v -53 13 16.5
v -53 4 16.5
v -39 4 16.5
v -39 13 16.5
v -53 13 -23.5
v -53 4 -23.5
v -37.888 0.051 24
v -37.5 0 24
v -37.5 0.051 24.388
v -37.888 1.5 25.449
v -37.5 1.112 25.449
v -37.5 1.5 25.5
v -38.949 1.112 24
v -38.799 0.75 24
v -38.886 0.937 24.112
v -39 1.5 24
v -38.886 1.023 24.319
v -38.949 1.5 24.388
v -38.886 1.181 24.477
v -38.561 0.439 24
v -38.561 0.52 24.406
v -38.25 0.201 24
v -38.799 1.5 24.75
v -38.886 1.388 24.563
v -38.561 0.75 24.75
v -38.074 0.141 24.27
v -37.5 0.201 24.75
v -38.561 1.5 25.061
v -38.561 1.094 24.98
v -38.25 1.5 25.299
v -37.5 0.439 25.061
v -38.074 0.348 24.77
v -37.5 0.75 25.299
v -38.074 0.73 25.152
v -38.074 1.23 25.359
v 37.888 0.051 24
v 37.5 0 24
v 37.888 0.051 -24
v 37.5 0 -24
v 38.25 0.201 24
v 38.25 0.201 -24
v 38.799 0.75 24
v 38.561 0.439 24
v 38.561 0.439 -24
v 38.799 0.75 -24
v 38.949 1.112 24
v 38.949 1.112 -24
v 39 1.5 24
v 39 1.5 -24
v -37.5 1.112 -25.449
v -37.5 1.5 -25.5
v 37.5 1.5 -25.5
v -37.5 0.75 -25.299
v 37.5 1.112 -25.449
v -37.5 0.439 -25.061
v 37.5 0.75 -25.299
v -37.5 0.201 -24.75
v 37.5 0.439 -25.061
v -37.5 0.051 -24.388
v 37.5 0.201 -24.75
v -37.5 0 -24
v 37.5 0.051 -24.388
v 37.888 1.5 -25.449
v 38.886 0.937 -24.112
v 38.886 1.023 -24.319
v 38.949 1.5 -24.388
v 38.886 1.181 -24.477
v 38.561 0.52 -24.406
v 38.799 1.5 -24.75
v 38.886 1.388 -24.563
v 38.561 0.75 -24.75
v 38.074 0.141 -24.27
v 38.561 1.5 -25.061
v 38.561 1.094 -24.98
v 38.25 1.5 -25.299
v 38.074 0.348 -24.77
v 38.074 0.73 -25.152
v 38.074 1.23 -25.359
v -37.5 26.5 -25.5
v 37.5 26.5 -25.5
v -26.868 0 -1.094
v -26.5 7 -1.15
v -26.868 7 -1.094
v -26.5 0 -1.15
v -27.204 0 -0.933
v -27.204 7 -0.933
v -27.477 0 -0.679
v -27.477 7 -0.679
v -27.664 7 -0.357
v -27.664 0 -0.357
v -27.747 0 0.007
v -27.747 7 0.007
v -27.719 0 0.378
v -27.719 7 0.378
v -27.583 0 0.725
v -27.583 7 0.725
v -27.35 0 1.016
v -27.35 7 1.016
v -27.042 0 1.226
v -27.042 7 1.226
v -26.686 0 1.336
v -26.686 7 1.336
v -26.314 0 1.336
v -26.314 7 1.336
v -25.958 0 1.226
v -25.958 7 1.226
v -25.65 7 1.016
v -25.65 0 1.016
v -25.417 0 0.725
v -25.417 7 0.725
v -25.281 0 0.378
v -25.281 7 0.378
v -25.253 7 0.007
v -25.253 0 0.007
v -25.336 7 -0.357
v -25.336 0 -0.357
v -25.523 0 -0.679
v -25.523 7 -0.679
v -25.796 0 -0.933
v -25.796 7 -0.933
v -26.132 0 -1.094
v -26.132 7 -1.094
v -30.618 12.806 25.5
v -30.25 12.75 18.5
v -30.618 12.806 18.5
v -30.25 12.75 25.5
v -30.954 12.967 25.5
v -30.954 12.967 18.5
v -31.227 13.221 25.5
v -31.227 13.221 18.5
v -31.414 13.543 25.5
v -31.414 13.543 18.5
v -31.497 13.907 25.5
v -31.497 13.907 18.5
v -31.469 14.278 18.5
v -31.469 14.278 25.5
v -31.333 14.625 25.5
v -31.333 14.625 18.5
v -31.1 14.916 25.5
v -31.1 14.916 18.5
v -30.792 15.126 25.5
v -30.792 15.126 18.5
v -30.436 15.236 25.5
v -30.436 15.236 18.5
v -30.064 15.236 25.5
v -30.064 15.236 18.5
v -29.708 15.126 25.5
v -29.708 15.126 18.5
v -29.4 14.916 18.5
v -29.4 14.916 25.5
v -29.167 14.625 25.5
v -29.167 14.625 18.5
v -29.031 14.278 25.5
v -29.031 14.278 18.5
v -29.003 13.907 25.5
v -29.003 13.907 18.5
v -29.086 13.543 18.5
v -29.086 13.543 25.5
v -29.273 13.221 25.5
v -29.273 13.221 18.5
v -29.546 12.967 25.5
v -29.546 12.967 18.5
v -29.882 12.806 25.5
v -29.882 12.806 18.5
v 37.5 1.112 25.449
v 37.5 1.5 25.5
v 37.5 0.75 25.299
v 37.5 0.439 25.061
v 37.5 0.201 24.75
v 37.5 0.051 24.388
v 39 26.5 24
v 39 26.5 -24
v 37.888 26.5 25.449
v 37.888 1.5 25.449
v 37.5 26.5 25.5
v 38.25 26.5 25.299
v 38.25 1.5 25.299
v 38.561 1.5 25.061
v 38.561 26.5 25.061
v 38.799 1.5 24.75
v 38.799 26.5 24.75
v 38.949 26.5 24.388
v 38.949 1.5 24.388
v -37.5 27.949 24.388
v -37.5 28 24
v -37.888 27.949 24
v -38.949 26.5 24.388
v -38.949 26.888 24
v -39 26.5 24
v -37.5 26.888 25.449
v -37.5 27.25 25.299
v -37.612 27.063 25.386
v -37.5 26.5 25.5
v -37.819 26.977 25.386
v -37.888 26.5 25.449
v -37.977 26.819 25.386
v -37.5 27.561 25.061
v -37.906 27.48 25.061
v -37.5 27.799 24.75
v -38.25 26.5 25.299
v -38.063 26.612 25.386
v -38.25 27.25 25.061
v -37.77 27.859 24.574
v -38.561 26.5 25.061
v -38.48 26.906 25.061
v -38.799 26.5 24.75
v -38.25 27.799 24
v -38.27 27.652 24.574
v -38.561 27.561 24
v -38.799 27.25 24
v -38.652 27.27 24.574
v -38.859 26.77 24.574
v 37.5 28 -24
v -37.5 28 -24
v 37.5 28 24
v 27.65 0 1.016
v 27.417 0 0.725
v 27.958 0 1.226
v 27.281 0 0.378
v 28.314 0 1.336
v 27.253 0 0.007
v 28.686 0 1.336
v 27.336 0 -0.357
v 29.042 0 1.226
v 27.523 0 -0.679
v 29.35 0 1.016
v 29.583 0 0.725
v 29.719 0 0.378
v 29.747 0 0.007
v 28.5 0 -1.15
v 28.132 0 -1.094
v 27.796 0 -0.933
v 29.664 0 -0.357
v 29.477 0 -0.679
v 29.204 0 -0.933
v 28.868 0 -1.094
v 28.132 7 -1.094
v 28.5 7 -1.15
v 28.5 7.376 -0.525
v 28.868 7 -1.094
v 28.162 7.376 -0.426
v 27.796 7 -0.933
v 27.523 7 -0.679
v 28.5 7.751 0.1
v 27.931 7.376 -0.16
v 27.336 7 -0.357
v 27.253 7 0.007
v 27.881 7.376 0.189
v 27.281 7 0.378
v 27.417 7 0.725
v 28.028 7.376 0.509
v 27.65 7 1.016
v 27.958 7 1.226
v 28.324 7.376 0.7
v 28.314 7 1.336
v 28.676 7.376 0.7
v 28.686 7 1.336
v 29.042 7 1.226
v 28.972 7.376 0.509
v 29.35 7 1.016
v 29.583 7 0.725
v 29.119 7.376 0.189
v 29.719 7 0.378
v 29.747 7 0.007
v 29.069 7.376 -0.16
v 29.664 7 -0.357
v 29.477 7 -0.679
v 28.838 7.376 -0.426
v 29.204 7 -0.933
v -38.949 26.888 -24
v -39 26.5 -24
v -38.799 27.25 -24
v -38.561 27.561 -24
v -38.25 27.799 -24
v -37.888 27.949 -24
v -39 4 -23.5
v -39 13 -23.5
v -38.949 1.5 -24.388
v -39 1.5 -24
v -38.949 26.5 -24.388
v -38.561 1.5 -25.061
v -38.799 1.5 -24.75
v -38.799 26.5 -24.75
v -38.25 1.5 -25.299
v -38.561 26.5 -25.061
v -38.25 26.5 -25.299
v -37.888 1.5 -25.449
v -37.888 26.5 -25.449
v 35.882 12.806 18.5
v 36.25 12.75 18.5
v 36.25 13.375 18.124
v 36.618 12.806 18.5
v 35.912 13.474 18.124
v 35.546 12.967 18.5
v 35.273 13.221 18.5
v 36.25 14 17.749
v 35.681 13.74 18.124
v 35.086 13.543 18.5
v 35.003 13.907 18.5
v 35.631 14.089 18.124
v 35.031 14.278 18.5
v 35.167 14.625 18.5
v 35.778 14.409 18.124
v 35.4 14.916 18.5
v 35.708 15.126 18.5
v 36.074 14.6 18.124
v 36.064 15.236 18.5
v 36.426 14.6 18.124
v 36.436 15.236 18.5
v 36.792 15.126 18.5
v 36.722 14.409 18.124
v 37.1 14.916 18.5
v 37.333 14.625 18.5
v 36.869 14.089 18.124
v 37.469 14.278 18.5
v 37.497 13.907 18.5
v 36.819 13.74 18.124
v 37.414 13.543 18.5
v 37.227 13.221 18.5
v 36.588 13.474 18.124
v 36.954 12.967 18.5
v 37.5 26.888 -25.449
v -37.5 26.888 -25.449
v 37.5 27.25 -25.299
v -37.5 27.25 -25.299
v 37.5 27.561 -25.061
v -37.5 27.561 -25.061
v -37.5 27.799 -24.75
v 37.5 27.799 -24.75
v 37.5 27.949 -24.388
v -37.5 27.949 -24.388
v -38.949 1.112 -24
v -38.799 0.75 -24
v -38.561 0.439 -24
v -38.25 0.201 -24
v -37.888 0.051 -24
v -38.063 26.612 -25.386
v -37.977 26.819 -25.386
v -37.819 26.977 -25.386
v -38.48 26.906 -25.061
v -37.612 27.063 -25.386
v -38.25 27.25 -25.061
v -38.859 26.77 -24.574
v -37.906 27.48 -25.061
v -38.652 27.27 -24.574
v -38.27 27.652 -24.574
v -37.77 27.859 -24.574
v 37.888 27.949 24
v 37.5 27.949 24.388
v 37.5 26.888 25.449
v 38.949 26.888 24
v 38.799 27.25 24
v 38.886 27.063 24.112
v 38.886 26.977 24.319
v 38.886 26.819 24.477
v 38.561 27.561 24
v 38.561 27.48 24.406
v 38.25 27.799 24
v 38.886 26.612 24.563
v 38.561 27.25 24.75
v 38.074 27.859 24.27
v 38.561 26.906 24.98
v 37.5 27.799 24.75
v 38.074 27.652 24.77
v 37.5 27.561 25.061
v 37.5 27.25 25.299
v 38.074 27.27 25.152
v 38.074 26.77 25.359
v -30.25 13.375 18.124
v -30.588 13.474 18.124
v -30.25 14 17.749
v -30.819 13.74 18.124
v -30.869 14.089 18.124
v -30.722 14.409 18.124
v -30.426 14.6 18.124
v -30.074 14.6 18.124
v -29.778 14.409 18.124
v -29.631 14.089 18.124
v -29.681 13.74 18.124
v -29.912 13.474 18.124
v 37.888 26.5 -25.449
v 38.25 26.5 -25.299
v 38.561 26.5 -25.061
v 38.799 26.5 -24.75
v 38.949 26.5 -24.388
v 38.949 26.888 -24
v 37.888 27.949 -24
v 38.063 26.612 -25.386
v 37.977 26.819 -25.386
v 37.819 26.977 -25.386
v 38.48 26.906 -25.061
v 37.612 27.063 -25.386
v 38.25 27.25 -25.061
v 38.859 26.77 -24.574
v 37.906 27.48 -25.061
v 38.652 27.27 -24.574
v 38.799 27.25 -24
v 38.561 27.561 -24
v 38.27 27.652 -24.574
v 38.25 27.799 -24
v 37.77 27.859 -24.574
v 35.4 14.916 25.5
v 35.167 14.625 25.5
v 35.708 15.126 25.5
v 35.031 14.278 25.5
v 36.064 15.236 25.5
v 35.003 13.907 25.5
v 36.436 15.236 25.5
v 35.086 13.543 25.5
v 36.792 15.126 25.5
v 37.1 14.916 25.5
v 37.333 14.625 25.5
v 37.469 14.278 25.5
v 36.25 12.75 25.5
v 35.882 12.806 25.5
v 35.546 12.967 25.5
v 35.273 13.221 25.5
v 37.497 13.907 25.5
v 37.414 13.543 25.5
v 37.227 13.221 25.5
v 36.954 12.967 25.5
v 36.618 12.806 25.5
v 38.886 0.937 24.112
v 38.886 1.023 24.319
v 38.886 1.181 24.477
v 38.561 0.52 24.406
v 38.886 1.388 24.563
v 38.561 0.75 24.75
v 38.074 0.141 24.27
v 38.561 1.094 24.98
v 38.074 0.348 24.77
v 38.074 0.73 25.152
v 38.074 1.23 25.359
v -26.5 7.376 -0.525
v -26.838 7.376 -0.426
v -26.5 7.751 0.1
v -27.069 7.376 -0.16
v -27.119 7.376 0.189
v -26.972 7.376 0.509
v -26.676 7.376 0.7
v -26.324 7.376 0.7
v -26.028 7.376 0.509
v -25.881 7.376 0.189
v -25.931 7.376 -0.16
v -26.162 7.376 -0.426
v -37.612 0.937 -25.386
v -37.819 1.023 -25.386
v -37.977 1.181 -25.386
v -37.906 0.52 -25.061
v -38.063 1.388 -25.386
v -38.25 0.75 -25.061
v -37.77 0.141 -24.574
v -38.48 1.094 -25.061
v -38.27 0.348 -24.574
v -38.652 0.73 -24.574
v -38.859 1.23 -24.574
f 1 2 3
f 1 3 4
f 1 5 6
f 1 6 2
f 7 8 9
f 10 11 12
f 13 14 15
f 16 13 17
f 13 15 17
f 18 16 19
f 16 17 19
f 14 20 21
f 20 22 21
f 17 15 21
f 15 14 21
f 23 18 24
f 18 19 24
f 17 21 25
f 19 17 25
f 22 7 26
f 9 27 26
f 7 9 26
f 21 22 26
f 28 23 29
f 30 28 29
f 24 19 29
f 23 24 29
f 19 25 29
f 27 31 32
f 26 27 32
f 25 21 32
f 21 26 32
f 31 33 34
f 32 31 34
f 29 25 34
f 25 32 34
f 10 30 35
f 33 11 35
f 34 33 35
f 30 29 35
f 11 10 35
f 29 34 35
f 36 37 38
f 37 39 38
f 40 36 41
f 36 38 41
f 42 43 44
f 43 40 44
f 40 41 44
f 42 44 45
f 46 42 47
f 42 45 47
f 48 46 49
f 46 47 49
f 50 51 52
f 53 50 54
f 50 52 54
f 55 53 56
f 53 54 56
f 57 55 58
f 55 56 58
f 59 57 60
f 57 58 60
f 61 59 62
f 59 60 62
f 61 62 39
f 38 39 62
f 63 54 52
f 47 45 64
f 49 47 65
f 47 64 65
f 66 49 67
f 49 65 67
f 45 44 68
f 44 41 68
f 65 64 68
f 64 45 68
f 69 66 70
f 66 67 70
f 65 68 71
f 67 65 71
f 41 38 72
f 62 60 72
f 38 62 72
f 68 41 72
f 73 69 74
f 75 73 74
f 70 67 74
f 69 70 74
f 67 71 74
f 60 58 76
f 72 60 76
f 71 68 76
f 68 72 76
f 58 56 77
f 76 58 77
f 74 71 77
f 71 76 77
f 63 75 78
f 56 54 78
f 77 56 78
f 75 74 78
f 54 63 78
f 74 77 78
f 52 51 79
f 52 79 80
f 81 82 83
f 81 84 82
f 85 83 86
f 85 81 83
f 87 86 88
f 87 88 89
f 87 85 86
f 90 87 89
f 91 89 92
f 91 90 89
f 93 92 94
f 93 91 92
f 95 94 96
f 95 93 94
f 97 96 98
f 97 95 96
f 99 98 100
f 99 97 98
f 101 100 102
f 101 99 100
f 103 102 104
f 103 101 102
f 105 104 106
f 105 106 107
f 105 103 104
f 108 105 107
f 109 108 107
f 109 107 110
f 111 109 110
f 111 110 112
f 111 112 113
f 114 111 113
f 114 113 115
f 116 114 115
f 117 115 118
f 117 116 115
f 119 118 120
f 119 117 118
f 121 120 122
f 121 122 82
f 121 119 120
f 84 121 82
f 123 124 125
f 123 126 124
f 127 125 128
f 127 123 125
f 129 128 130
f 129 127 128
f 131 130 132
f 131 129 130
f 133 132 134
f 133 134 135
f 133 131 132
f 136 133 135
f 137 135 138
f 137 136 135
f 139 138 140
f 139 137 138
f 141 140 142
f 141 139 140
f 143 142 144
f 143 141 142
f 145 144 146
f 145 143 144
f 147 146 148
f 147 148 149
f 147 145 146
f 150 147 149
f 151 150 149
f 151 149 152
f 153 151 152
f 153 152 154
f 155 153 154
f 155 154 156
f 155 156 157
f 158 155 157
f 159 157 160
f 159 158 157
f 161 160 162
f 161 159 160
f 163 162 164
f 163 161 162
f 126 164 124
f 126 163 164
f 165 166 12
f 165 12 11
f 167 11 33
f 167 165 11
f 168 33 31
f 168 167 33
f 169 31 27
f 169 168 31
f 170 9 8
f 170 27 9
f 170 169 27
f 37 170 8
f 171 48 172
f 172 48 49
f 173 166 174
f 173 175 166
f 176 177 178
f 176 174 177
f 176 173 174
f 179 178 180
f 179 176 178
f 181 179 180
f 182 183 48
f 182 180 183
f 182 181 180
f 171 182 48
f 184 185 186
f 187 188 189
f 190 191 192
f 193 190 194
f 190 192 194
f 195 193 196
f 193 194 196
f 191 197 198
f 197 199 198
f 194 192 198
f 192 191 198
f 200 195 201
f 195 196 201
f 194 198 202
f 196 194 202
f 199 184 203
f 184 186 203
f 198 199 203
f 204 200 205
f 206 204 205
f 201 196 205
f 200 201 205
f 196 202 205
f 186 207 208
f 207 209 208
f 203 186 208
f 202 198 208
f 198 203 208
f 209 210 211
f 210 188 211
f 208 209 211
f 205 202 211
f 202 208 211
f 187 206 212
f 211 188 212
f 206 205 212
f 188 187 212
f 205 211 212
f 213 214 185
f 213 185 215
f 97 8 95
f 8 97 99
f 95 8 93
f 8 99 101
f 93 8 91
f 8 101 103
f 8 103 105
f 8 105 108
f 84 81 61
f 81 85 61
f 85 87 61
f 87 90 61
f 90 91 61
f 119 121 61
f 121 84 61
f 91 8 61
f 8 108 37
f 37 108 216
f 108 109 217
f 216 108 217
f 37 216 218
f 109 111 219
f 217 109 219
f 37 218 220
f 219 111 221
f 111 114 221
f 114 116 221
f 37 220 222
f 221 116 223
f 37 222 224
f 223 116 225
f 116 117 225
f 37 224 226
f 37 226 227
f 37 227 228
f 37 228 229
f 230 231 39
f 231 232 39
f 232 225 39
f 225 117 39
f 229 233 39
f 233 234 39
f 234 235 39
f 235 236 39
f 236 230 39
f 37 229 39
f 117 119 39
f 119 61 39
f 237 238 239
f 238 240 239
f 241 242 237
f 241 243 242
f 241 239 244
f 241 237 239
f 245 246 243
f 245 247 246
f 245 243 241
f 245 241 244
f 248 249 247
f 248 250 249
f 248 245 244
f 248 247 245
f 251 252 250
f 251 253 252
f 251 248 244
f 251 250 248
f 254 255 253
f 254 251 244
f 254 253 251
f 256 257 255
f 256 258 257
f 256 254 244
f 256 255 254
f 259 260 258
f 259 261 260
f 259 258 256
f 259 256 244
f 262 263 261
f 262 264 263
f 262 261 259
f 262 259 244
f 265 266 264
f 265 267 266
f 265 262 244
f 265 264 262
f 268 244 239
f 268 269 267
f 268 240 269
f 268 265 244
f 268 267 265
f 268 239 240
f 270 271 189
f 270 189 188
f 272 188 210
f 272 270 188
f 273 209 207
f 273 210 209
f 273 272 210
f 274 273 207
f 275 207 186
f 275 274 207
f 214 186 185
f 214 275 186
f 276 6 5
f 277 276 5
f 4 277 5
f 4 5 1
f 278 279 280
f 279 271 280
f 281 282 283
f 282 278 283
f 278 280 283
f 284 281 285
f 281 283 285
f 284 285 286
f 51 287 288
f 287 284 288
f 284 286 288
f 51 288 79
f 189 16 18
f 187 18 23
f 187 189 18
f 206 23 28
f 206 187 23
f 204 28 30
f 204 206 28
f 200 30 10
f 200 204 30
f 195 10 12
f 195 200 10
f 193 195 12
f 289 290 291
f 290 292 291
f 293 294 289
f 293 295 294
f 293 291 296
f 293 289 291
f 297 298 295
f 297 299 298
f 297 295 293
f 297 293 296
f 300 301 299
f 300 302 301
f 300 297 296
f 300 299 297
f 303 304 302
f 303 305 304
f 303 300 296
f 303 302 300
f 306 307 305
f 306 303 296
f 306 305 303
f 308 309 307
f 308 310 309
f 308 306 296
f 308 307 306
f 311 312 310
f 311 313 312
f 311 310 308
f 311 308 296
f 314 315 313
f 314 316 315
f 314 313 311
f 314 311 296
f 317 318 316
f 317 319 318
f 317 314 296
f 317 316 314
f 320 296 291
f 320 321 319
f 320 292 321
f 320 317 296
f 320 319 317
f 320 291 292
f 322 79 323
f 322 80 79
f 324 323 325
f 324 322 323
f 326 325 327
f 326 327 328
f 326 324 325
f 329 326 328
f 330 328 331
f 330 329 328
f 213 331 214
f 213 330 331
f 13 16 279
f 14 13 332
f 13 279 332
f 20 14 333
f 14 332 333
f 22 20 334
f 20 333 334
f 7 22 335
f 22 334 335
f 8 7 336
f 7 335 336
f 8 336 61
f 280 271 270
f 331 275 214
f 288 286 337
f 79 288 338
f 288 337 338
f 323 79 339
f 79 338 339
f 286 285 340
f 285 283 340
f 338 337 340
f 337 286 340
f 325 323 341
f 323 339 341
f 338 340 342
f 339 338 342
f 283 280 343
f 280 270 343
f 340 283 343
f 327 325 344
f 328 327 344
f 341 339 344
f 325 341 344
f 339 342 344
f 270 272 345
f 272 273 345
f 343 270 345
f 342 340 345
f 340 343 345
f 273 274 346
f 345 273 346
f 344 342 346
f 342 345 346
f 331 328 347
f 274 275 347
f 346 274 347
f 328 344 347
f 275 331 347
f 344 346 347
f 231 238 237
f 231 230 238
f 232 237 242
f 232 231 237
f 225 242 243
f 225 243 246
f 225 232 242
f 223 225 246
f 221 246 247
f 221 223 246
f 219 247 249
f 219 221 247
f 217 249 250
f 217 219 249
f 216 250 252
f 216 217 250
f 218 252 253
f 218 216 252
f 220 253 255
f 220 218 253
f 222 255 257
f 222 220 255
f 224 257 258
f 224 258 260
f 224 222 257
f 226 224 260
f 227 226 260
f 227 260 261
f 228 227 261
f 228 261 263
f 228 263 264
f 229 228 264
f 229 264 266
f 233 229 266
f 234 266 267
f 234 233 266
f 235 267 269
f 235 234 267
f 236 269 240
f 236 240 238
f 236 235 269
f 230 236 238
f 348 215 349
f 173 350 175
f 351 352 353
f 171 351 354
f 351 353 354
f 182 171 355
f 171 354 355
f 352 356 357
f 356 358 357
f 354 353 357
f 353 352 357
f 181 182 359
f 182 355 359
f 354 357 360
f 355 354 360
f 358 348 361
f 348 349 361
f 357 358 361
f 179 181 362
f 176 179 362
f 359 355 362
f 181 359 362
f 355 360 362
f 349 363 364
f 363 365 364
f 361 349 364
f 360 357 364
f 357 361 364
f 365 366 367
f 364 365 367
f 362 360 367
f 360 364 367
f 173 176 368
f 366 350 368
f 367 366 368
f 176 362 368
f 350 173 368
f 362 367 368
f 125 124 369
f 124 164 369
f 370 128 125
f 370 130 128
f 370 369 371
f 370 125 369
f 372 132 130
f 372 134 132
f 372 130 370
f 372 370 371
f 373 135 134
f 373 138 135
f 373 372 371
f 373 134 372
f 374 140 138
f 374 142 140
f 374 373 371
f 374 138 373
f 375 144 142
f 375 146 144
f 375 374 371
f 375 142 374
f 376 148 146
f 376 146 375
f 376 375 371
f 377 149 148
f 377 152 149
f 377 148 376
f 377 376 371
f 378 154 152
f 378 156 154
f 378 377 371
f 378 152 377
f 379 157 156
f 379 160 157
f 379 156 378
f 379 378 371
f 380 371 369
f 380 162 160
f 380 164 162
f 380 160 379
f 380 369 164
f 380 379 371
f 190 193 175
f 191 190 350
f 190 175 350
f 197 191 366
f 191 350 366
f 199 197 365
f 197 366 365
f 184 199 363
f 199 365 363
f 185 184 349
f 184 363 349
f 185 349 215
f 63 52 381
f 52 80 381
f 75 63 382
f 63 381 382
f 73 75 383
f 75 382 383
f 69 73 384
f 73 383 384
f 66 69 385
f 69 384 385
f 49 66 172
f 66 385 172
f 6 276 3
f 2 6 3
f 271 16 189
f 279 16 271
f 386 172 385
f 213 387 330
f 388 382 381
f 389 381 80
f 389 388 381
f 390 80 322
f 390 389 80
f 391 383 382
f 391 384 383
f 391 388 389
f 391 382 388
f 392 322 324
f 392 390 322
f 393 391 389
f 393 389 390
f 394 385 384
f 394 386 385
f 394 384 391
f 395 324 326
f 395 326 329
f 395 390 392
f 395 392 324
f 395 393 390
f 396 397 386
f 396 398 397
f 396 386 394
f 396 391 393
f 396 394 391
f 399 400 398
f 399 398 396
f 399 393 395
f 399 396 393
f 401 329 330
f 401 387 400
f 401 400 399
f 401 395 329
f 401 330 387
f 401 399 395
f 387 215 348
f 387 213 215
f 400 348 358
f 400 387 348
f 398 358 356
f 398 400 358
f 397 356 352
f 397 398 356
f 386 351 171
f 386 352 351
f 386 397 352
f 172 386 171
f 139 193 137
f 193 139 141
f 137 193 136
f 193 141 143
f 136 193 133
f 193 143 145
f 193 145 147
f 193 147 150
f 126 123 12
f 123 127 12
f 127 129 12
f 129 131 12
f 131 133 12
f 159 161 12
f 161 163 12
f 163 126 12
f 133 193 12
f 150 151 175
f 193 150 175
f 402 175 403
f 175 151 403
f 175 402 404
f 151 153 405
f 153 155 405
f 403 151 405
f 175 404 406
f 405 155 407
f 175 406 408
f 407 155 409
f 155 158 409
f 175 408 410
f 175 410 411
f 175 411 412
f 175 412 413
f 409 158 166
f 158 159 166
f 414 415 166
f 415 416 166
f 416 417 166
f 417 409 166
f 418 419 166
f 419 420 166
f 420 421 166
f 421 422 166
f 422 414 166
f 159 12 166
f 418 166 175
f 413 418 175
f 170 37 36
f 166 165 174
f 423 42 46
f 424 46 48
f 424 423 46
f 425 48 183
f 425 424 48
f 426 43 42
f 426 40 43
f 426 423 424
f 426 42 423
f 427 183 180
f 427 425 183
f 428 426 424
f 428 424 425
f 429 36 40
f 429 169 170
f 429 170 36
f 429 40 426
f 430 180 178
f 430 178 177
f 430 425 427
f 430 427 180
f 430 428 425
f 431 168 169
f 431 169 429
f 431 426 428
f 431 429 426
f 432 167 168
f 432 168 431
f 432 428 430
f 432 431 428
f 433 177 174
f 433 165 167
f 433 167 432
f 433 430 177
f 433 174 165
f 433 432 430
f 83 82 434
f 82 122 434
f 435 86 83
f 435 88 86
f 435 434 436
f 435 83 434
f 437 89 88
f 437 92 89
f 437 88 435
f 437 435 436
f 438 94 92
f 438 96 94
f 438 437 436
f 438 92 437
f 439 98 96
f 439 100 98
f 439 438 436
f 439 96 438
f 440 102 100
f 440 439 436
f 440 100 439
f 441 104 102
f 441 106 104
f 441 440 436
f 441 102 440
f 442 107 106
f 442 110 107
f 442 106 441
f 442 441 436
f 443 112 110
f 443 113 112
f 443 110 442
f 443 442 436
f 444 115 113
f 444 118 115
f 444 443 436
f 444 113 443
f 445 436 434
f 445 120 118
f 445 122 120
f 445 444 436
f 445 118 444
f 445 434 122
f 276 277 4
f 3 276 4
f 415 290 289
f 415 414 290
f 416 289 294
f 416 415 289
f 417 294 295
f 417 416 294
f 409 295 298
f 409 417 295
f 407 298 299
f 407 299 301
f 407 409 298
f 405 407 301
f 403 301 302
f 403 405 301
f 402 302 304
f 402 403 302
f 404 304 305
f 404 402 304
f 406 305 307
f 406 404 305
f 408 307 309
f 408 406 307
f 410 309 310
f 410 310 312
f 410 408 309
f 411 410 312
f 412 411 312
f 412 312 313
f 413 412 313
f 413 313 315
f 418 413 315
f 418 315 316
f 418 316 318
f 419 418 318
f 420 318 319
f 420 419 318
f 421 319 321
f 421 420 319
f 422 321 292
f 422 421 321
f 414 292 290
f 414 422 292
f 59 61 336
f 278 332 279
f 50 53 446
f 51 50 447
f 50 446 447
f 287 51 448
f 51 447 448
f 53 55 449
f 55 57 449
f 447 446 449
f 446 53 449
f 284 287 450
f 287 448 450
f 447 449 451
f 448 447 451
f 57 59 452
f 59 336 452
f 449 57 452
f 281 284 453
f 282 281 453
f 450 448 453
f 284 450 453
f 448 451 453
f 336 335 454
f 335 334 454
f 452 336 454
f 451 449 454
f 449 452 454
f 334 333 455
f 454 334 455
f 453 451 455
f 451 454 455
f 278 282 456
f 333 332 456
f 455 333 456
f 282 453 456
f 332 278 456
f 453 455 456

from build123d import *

# Parameters (mm, degrees)
SKETCH2_W           = 78
SKETCH2_H           = 51.00000000000001
BOSS_EXTRUDE1_DEPTH = 28
SKETCH3_W           = 40
SKETCH3_H           = 9.000000000000002
BOSS_EXTRUDE2_DEPTH = 14
FILLET1_R           = 1.5


with BuildPart() as part:
    # Sketch2 → Boss-Extrude1 (new body)
    with BuildSketch(Plane(origin=(0, 0, 0), x_dir=(1, 0, 0), z_dir=(0, 1, 0))):
        Rectangle(SKETCH2_W, SKETCH2_H)
    extrude(amount=BOSS_EXTRUDE1_DEPTH)

    # Sketch5 → Tap Drill for M3 Tap1 (revolve, cut)
    with BuildSketch(Plane(origin=(-26.499999999999996, 0, 0.0999999999999994), x_dir=(0, 0, -1), z_dir=(1, 0, 0))):
        Polygon((0, 0), (-1.9e-15, 7.751075773784449), (1.2499999999999876, 7.000000000000006), (1.249999999999989, -1.4e-15), align=None)
    revolve(axis=Axis((-26.499999999999996, -6.349999999999991, 0.0999999999999994), (0, 1, 0)), mode=Mode.SUBTRACT)

    # Sketch5 at point 2 (carried to point 2, square into its face) → Tap Drill for M3 Tap1 at 2 (revolve, cut)
    with BuildSketch(Plane(origin=(28.5, 0, 0.1), x_dir=(0, 0, -1), z_dir=(1, 0, 0))):
        Polygon((0, 0), (-1.9e-15, 7.751075773784449), (1.2499999999999876, 7.000000000000006), (1.249999999999989, -1.4e-15), align=None)
    revolve(axis=Axis((28.5, -6.35, 0.1), (0, 1, 0)), mode=Mode.SUBTRACT)

    # Sketch5 at point 3 (carried to point 3, square into its face) → Tap Drill for M3 Tap1 at 3 (revolve, cut)
    with BuildSketch(Plane(origin=(-30.25, 14, 25.5), x_dir=(0, -1, 0), z_dir=(1, 0, 0))):
        Polygon((0, 0), (-1.9e-15, 7.751075773784449), (1.2499999999999876, 7.000000000000006), (1.249999999999989, -1.4e-15), align=None)
    revolve(axis=Axis((-30.25, 14, 31.85), (0, 0, -1)), mode=Mode.SUBTRACT)

    # Sketch5 at point 4 (carried to point 4, square into its face) → Tap Drill for M3 Tap1 at 4 (revolve, cut)
    with BuildSketch(Plane(origin=(36.25, 14, 25.5), x_dir=(0, -1, 0), z_dir=(1, 0, 0))):
        Polygon((0, 0), (-1.9e-15, 7.751075773784449), (1.2499999999999876, 7.000000000000006), (1.249999999999989, -1.4e-15), align=None)
    revolve(axis=Axis((36.25, 14, 31.85), (0, 0, -1)), mode=Mode.SUBTRACT)

    # Fillet1
    fillet1_edges = [part.edges().sort_by_distance(p)[0] for p in [
        (-38.99999999999999, 28, 0),
        (7.11e-15, 28, 25.5),
        (39.00000000000001, 28, 0),
        (7.11e-15, 0, 25.5),
        (-38.99999999999999, 0, 0),
        (7.11e-15, 0, -25.5),
        (39.00000000000001, 0, 0),
        (39.00000000000001, 14, 25.5),
        (-38.99999999999999, 14, 25.5),
        (-38.99999999999999, 14, -25.5),
        (39.00000000000001, 14, -25.5),
        (7.11e-15, 28, -25.5),
    ]]
    fillet(fillet1_edges, radius=FILLET1_R)


with BuildPart() as body_2:
    # Sketch3 → Boss-Extrude2 (new body)
    with BuildSketch(Plane.ZY.offset(38.99999999999999)):
        with Locations((-3.5, 8.5)):
            Rectangle(SKETCH3_W, SKETCH3_H)
    extrude(amount=BOSS_EXTRUDE2_DEPTH)


solid = Compound([part.part, body_2.part])
